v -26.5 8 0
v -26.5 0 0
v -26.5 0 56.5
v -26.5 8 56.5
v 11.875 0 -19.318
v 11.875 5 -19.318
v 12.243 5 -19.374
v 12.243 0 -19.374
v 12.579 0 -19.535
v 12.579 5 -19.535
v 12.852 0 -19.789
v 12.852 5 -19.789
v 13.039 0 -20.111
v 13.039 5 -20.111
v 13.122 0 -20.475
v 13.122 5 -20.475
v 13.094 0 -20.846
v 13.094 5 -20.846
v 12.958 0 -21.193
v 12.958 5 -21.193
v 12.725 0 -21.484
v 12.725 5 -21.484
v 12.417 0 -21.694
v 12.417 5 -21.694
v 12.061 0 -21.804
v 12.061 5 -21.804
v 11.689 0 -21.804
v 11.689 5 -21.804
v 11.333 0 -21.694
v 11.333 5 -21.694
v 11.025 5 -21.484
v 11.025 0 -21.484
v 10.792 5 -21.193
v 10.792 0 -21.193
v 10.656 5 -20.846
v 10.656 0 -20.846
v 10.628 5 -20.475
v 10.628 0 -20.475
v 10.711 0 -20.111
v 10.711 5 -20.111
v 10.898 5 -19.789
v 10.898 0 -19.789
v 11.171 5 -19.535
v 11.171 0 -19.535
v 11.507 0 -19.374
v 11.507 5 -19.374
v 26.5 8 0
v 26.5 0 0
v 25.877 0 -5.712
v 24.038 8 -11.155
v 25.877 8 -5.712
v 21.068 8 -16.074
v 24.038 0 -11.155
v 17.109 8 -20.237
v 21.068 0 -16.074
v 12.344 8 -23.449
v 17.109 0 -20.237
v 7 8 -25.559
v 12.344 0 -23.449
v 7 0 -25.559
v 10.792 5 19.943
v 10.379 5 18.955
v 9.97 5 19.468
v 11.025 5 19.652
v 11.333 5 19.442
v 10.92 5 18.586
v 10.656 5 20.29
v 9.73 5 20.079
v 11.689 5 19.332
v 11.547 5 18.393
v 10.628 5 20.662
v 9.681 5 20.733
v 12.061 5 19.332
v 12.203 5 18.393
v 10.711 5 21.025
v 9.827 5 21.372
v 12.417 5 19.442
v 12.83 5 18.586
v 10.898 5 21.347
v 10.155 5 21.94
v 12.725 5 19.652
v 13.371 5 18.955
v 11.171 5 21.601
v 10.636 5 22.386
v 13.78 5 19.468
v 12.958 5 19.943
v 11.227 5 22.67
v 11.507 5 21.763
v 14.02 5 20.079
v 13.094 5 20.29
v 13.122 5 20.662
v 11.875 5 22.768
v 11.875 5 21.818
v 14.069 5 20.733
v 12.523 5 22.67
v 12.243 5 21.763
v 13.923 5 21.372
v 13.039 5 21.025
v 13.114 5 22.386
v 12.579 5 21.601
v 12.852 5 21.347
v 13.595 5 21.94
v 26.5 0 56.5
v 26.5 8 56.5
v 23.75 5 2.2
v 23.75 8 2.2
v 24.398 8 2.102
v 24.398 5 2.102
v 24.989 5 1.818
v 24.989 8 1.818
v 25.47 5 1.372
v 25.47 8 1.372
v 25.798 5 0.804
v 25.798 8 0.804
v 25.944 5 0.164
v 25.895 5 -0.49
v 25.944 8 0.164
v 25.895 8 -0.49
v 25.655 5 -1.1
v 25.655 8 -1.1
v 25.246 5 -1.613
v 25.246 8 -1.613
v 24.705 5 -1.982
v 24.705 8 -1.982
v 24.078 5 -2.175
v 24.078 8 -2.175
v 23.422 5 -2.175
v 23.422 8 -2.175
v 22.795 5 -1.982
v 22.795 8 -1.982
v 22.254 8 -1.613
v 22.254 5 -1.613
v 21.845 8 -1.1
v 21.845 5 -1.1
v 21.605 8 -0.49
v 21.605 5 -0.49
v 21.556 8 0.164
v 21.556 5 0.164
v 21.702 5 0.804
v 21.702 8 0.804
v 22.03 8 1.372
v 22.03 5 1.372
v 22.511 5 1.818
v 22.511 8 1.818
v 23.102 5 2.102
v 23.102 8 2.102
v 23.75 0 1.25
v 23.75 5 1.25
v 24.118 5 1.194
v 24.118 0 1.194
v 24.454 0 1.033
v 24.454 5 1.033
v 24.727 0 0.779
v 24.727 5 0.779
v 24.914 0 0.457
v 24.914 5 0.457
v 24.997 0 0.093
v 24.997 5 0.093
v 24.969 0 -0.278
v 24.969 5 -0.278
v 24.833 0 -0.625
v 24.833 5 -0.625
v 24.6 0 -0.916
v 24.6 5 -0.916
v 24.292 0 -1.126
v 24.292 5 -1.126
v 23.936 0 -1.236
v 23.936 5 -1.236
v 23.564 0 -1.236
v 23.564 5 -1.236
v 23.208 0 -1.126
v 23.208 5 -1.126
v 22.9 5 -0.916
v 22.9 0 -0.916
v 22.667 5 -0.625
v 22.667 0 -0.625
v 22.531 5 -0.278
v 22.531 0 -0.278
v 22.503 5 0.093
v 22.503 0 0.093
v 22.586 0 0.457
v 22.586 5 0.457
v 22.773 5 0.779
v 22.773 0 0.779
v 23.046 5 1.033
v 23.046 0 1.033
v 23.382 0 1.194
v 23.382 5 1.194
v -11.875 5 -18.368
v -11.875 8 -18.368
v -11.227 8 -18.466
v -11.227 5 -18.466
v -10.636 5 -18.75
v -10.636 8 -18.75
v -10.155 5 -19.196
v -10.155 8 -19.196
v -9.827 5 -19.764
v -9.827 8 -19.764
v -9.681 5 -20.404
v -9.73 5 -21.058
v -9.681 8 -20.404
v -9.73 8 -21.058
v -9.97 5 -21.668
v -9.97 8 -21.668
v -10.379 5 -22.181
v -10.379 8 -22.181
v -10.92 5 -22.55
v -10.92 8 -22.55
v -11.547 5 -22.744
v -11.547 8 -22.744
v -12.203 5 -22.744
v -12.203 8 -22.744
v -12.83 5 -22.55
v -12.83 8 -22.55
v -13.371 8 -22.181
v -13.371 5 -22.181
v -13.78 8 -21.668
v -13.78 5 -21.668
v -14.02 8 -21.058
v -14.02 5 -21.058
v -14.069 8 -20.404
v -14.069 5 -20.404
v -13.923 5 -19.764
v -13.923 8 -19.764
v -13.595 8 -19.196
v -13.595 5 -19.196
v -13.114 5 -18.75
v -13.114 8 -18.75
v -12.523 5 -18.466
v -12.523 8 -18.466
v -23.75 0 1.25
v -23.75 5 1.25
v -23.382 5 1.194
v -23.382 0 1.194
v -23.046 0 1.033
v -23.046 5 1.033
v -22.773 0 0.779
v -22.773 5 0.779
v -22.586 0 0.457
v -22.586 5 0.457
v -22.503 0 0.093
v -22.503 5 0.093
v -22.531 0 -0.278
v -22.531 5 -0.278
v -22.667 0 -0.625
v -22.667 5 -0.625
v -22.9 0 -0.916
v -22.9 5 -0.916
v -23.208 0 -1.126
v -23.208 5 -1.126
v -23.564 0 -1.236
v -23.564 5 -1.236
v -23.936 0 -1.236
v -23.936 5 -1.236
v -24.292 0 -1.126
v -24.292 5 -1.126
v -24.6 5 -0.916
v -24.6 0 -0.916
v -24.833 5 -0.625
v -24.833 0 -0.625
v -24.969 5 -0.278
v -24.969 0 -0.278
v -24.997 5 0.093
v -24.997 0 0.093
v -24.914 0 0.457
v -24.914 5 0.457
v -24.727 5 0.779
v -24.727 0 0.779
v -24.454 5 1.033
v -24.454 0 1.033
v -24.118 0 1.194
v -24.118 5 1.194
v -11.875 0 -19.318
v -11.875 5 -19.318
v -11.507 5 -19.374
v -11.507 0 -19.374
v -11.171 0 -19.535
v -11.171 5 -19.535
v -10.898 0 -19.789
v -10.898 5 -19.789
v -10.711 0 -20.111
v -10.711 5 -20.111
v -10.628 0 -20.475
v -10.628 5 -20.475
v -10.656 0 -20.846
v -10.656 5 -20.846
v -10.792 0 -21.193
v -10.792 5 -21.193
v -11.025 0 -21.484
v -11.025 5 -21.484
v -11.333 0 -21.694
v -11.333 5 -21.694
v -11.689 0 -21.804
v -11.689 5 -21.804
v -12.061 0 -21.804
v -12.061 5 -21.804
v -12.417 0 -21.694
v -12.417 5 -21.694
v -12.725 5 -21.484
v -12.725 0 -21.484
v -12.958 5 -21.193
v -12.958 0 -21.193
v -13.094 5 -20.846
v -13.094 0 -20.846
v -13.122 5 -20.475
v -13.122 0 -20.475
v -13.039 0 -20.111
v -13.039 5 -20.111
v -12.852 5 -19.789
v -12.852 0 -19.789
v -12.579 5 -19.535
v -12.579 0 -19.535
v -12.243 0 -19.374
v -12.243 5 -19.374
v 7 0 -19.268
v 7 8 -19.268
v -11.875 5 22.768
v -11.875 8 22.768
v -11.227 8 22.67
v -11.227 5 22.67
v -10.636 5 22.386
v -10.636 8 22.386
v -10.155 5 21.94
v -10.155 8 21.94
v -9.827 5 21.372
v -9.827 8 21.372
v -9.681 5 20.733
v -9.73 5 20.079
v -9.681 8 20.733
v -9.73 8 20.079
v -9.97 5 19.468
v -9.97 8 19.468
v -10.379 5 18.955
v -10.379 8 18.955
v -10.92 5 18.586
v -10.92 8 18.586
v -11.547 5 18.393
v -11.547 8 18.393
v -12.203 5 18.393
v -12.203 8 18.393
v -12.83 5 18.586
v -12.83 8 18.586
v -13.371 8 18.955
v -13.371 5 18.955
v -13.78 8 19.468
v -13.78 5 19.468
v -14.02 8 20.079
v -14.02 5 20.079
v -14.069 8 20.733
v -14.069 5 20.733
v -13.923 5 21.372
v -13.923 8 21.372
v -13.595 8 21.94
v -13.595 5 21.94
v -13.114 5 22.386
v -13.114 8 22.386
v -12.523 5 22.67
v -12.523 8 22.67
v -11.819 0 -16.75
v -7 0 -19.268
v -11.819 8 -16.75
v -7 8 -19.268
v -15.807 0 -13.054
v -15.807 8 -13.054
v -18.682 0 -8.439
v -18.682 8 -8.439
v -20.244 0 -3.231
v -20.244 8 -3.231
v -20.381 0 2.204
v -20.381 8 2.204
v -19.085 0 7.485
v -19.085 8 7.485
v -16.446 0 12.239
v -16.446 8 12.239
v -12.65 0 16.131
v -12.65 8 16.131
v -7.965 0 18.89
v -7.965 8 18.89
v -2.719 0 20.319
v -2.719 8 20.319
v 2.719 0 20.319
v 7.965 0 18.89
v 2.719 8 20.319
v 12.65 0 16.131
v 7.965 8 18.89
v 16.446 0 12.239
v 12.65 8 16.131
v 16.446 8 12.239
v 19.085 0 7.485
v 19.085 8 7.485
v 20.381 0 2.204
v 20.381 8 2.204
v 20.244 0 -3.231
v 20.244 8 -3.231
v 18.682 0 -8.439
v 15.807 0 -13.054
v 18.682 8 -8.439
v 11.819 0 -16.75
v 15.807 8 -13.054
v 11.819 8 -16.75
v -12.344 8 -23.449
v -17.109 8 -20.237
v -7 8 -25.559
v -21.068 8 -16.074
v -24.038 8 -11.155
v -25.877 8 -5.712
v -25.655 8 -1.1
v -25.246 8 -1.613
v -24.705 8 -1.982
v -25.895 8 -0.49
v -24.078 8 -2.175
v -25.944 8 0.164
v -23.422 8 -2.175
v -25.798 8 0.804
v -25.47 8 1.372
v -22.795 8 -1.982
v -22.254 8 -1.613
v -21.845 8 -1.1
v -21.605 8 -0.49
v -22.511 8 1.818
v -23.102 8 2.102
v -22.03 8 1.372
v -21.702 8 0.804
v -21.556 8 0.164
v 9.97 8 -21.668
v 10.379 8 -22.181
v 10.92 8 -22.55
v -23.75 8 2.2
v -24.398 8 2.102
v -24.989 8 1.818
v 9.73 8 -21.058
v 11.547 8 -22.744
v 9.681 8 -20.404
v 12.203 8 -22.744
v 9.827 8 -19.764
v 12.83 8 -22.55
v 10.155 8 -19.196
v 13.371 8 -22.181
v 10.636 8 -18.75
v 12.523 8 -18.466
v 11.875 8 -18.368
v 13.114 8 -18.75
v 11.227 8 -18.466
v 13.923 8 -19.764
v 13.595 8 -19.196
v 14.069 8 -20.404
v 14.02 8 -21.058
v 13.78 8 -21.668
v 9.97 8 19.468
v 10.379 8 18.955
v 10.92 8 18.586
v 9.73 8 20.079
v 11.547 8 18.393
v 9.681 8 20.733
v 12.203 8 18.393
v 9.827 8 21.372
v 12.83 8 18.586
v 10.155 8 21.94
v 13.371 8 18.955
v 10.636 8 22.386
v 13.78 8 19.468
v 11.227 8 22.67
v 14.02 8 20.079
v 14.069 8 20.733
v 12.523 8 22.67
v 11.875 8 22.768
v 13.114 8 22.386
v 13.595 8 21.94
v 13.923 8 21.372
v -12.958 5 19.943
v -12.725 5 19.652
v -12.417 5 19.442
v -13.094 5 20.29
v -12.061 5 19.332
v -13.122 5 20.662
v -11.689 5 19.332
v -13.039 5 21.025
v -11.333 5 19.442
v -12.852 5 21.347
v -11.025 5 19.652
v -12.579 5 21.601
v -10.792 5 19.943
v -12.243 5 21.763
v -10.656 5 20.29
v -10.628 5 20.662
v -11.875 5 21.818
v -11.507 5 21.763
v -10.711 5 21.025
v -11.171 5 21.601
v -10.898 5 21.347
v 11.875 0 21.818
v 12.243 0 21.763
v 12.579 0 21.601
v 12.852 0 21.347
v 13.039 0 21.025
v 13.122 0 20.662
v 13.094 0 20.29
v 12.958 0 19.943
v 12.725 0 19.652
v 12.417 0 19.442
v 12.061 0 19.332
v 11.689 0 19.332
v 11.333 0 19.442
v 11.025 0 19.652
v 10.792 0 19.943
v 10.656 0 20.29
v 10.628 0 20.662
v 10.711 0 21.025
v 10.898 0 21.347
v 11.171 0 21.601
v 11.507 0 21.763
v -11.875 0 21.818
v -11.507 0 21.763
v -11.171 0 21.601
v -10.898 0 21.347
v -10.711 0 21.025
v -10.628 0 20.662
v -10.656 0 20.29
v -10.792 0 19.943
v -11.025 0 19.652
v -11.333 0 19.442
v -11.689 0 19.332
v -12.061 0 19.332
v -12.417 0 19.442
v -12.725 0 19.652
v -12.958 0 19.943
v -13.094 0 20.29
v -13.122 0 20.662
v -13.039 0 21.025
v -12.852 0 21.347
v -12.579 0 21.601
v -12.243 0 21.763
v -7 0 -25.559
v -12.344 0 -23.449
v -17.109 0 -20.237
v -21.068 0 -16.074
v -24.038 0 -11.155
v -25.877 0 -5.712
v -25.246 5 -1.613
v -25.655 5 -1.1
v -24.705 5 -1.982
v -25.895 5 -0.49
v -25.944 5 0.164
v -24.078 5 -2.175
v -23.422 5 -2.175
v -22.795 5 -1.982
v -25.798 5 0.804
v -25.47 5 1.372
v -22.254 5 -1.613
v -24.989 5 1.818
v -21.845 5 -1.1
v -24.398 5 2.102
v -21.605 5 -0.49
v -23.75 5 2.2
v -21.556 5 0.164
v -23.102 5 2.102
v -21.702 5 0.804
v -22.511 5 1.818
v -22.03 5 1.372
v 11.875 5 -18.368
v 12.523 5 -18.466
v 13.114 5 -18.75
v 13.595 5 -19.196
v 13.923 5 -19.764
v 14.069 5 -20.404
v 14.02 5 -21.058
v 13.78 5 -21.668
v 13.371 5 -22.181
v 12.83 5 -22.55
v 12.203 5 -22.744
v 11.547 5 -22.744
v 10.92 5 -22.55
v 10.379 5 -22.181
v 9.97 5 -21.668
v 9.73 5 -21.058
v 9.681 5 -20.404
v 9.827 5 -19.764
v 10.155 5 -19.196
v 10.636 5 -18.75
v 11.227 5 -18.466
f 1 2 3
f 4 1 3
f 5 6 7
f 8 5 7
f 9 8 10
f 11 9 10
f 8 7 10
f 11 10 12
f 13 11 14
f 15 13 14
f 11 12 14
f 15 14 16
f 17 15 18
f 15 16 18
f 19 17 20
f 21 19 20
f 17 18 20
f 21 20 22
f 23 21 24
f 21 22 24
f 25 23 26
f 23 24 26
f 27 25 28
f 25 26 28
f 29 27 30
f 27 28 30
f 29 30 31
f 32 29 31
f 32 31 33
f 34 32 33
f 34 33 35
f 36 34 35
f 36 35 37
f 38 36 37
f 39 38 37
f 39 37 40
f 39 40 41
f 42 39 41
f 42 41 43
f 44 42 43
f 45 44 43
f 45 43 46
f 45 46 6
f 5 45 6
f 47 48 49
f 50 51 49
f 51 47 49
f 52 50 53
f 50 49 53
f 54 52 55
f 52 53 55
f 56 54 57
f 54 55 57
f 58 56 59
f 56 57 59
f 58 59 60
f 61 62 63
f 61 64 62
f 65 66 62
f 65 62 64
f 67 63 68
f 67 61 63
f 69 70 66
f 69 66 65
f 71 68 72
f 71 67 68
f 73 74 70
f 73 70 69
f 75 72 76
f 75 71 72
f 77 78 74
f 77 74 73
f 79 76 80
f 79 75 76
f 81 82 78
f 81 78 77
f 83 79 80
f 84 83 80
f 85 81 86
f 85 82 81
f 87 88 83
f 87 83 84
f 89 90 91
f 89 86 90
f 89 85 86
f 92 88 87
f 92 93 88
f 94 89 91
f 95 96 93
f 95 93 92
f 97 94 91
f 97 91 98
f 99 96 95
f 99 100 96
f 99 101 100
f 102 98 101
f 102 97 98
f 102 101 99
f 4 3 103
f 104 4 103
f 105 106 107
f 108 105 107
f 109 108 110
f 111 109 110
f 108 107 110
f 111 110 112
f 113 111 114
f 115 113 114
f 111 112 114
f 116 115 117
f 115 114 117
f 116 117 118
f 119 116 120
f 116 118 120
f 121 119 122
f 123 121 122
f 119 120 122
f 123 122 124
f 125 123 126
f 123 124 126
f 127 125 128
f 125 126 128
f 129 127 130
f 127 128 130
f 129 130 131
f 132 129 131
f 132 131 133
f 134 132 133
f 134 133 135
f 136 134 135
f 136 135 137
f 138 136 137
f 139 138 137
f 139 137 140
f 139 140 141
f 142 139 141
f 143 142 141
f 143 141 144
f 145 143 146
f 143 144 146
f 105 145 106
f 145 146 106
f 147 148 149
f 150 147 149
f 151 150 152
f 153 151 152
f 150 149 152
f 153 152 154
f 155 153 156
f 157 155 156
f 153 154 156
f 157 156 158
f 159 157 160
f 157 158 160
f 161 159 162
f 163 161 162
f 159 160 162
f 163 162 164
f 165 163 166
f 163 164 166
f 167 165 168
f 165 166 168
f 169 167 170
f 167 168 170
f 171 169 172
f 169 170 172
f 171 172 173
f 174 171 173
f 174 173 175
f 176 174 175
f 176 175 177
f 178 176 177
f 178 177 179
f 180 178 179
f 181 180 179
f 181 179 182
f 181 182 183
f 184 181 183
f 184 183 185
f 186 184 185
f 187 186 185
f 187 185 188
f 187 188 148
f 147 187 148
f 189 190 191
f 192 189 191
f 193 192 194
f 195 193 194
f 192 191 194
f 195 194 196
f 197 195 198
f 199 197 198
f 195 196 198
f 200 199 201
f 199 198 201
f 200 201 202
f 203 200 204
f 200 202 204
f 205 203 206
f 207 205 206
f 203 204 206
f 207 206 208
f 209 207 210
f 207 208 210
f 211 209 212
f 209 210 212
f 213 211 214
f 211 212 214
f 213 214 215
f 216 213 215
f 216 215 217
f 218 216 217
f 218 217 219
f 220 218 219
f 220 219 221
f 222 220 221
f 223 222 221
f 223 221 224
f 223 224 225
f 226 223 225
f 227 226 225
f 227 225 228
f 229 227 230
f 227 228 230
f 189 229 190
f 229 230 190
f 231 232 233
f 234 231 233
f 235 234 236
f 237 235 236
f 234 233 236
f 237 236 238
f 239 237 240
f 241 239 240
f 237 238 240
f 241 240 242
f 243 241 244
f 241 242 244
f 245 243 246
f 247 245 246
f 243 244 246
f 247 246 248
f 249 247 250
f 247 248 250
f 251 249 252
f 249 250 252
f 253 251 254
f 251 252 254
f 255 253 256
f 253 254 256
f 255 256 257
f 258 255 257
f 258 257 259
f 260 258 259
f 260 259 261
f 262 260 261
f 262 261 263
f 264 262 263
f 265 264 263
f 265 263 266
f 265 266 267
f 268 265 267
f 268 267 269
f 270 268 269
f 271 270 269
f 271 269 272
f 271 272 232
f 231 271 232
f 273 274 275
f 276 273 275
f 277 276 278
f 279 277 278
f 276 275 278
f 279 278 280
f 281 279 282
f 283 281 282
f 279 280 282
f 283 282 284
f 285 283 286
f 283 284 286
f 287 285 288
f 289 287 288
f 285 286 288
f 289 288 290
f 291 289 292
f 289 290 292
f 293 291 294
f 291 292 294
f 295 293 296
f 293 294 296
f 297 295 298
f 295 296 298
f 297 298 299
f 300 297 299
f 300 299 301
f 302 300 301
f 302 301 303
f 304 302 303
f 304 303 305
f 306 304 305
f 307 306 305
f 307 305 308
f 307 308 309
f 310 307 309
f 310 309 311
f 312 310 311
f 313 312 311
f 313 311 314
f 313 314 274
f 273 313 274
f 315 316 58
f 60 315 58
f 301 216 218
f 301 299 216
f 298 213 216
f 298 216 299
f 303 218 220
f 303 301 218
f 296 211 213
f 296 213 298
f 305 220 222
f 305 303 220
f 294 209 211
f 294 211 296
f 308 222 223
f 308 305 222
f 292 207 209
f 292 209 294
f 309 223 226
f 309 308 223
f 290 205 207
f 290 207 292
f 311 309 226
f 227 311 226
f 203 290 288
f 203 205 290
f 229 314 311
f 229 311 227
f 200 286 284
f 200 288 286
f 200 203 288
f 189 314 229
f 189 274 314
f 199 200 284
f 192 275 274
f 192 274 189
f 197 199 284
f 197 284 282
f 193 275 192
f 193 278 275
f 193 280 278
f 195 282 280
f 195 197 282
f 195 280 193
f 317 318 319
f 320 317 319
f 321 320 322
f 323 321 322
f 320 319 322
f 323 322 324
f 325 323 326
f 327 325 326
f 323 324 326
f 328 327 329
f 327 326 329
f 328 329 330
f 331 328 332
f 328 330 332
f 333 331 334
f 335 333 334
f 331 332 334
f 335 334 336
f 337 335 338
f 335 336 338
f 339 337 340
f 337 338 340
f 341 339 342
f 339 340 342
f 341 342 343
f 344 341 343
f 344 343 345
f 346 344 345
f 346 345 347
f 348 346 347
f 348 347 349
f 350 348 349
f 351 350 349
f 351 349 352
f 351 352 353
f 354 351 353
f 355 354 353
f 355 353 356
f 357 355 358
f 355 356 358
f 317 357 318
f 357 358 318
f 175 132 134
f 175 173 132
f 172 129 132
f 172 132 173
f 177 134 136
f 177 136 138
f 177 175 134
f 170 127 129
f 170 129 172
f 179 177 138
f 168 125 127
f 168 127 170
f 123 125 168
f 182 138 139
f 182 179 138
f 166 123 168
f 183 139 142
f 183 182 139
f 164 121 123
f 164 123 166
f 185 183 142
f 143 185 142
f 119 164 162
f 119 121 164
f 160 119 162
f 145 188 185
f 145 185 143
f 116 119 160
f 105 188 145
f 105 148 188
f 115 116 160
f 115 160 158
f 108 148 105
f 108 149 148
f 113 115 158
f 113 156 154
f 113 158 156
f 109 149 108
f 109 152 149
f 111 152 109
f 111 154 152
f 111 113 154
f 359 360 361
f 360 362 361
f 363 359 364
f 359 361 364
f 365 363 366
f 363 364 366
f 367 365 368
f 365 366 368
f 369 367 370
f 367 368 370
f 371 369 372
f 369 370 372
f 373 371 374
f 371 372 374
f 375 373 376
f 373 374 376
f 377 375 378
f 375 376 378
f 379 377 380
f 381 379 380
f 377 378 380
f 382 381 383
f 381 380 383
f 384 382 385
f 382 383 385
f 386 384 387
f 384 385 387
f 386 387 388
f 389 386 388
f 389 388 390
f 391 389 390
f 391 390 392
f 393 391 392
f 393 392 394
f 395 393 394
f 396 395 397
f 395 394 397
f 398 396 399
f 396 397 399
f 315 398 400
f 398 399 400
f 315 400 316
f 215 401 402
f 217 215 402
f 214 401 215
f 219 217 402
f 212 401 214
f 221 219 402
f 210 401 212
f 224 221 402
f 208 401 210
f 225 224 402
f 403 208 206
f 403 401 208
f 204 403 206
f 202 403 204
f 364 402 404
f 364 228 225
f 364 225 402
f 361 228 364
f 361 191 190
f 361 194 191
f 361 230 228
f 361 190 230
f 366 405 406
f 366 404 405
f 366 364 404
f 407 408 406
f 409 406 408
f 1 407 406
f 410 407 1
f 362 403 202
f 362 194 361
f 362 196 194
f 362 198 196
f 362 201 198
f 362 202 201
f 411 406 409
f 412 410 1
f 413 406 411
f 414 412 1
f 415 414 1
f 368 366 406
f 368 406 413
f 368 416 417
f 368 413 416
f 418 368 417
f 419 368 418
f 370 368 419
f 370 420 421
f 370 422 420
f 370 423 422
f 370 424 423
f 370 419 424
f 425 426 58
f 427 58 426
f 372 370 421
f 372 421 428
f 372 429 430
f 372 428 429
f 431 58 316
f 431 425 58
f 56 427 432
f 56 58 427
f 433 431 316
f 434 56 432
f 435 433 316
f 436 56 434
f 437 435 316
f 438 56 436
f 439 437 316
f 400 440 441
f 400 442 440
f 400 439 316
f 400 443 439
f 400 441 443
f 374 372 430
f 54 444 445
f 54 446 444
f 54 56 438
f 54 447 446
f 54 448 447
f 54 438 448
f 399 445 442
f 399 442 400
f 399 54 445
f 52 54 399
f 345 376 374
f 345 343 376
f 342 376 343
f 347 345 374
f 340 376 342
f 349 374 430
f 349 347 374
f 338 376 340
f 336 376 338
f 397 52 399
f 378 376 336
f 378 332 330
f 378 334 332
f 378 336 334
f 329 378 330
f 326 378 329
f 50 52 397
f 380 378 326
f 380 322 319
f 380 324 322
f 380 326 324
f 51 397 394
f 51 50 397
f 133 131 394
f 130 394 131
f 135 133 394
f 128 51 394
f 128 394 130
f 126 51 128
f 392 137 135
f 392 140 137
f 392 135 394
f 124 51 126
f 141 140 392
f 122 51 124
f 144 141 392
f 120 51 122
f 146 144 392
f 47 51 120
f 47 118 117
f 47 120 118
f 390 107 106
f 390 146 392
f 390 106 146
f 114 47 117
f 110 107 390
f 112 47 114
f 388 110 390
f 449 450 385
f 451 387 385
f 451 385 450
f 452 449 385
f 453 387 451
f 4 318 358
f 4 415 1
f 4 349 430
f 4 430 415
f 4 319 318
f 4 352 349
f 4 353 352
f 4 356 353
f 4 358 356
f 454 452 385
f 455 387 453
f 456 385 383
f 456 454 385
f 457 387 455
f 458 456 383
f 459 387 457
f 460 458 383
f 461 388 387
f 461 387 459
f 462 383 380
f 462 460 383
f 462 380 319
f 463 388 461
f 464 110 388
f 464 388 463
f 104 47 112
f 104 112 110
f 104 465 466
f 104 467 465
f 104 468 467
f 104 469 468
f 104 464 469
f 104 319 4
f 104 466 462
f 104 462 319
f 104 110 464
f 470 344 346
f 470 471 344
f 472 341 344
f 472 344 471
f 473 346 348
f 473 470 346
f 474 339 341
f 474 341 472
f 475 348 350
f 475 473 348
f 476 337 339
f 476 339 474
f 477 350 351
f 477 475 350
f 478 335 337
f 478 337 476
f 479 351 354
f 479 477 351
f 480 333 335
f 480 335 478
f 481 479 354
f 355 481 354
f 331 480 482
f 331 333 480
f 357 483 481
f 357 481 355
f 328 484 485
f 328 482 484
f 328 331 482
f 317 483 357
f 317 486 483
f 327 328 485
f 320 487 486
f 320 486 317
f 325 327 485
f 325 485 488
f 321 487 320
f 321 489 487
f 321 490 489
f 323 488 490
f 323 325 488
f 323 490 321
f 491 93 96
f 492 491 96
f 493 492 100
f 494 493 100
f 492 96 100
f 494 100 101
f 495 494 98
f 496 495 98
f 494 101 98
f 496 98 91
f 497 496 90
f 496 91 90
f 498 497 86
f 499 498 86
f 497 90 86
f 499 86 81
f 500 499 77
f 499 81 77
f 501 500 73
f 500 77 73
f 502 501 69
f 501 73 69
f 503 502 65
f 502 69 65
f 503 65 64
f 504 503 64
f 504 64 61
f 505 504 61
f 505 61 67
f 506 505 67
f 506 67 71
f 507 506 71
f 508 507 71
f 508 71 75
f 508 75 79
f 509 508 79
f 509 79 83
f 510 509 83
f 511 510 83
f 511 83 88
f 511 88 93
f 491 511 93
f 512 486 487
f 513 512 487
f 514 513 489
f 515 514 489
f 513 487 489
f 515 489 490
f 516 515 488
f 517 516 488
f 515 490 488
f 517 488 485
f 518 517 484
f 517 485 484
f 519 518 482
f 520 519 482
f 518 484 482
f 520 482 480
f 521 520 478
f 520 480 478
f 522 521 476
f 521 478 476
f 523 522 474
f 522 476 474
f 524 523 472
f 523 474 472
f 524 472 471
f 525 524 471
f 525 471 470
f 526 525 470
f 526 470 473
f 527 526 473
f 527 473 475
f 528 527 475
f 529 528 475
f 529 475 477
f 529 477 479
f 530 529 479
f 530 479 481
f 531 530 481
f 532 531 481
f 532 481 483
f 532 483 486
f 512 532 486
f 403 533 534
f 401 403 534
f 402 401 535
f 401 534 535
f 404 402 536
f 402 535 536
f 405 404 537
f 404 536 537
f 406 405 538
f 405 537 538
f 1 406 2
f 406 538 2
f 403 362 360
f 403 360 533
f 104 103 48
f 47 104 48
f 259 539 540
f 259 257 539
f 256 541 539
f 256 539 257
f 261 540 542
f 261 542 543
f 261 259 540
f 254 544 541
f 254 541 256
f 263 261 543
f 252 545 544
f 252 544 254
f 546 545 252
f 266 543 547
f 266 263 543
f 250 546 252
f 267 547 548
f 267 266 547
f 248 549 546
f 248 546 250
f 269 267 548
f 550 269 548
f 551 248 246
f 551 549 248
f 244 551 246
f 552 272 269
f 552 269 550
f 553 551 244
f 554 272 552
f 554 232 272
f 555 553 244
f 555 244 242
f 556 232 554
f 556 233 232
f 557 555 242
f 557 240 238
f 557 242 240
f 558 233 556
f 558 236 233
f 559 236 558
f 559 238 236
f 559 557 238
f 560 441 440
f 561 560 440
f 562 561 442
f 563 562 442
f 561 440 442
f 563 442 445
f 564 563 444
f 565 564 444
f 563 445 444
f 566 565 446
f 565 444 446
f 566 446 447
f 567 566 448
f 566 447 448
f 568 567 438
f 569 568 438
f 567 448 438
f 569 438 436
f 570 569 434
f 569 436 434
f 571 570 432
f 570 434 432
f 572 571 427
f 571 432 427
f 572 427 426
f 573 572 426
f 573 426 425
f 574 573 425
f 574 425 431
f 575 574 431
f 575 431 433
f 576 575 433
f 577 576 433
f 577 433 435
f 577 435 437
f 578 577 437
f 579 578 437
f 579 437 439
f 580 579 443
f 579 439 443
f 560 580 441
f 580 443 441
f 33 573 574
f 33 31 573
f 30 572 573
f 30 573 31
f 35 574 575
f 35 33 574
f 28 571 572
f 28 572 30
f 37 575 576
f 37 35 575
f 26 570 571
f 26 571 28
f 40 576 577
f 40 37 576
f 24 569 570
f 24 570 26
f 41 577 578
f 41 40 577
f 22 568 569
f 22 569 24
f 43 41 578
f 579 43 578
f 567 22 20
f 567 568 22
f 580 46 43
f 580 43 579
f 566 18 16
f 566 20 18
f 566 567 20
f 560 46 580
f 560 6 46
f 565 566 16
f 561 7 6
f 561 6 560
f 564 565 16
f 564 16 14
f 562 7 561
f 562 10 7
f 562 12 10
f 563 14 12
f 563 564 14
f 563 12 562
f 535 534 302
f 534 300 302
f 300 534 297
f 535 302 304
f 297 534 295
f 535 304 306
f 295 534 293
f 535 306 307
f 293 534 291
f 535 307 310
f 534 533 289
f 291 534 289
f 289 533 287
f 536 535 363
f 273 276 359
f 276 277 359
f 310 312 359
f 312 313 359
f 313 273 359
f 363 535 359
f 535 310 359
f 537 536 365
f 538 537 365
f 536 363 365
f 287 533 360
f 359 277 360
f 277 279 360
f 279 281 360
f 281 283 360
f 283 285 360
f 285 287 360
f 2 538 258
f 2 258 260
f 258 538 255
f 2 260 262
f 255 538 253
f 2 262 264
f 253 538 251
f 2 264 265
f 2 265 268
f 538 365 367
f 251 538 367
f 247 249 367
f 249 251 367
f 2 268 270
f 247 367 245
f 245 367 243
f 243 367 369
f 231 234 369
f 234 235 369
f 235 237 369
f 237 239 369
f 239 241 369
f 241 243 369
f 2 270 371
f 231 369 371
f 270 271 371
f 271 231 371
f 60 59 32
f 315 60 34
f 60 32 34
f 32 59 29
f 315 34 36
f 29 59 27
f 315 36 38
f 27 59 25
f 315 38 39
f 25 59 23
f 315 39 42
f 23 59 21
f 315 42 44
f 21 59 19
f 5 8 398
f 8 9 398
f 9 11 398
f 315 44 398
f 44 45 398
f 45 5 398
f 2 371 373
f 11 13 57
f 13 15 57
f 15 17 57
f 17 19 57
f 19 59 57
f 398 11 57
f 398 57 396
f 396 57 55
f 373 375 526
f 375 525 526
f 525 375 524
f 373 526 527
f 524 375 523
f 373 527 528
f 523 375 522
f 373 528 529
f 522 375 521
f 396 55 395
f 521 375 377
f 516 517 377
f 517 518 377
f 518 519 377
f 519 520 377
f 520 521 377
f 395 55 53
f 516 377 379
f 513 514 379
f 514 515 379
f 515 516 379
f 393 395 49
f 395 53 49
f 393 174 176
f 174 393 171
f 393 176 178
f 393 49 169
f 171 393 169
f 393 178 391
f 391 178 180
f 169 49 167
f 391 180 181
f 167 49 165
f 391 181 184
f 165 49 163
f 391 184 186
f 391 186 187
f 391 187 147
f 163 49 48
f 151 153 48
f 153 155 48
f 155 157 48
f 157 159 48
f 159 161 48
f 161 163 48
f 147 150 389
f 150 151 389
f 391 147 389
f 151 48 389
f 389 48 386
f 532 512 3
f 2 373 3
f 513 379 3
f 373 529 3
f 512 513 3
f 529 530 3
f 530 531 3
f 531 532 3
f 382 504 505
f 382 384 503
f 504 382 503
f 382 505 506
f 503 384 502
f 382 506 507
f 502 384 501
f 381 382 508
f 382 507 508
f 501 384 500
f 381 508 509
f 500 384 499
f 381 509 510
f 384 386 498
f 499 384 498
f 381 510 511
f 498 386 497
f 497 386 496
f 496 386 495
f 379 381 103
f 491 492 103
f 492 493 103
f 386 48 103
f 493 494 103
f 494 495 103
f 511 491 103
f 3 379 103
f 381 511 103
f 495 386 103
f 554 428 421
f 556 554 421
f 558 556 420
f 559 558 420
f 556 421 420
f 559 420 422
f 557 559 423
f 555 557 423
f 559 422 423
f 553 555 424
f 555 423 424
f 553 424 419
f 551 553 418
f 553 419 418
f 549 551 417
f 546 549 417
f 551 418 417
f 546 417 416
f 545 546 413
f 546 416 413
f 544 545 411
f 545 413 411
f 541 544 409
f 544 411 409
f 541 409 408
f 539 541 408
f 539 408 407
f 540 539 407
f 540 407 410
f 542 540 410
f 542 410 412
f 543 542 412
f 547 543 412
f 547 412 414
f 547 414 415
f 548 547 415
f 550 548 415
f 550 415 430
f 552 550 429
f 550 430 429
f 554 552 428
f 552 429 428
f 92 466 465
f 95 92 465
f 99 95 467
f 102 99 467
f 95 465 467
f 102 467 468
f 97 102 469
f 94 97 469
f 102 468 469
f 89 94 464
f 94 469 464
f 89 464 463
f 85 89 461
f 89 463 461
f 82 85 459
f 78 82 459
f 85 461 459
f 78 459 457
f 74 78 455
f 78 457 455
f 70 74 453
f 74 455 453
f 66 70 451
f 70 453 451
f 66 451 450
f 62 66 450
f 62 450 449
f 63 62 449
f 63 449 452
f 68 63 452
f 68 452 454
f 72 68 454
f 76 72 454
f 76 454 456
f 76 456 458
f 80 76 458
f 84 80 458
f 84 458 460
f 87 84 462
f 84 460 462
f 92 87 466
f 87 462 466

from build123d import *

# Parameters (mm, degrees)
SKETCH1_R           = 26.5
BOSS_EXTRUDE1_DEPTH = 8
SKETCH2_R           = 20.5
CUT_EXTRUDE1_DEPTH  = 8
SKETCH3_W           = 14
SKETCH3_H           = 29.703096534
CUT_EXTRUDE2_DEPTH  = 15
BOSS_EXTRUDE2_START = -8
BOSS_EXTRUDE2_DEPTH = 8
SKETCH5_R           = 1.25
CUT_EXTRUDE3_DEPTH  = 8
SKETCH6_R           = 2.2
CUT_EXTRUDE4_DEPTH  = 3


with BuildPart() as part:
    # Sketch1 → Boss-Extrude1 (new body)
    with BuildSketch(Plane(origin=(0, 0, 0), x_dir=(1, 0, 0), z_dir=(0, 1, 0))):
        with Locations(Location((0, 0, 0), (0, 0, 270))):
            Circle(SKETCH1_R)
    extrude(amount=BOSS_EXTRUDE1_DEPTH)

    # Sketch2 → Cut-Extrude1 (cut)
    with BuildSketch(Plane(origin=(0, 8, 0), x_dir=(1, 0, 0), z_dir=(0, 1, 0))):
        with Locations(Location((0, 0, 0), (0, 0, 270))):
            Circle(SKETCH2_R)
    extrude(amount=-CUT_EXTRUDE1_DEPTH, mode=Mode.SUBTRACT)

    # Sketch3 → Cut-Extrude2 (cut)
    with BuildSketch(Plane(origin=(0, 8, 0), x_dir=(1, 0, 0), z_dir=(0, 1, 0))):
        with Locations((0, 12.871341831)):
            Rectangle(SKETCH3_W, SKETCH3_H)
    extrude(amount=-CUT_EXTRUDE2_DEPTH, mode=Mode.SUBTRACT)

    # Sketch4 → Boss-Extrude2 (add)
    with BuildSketch(Plane(origin=(0, 8, 0), x_dir=(1, 0, 0), z_dir=(0, 1, 0)).offset(BOSS_EXTRUDE2_START)):
        with BuildLine():
            Line((-26.5, 0), (-26.5, -56.5))
            Line((-26.5, -56.5), (26.5, -56.5))
            Line((26.5, -56.5), (26.5, 0))
            ThreePointArc((26.5, 0), (0, -26.5), (-26.5, 0))
        make_face()
    extrude(amount=BOSS_EXTRUDE2_DEPTH)

    # Sketch5 → Cut-Extrude3 (cut)
    with BuildSketch(Plane(origin=(0, 8, 0), x_dir=(1, 0, 0), z_dir=(0, 1, 0))):
        with Locations(Location((23.75, 0, 0), (0, 0, 270))):
            Circle(SKETCH5_R)
        with Locations(Location((11.875, -20.56810334, 0), (0, 0, 270))):
            Circle(SKETCH5_R)
        with Locations(Location((-11.875, -20.56810334, 0), (0, 0, 270))):
            Circle(SKETCH5_R)
        with Locations(Location((-23.75, 0, 0), (0, 0, 270))):
            Circle(SKETCH5_R)
        with Locations(Location((-11.875, 20.56810334, 0), (0, 0, 270))):
            Circle(SKETCH5_R)
        with Locations(Location((11.875, 20.56810334, 0), (0, 0, 270))):
            Circle(SKETCH5_R)
    extrude(amount=-CUT_EXTRUDE3_DEPTH, mode=Mode.SUBTRACT)

    # Sketch6 → Cut-Extrude4 (cut)
    with BuildSketch(Plane(origin=(0, 8, 0), x_dir=(1, 0, 0), z_dir=(0, 1, 0))):
        with Locations(Location((23.75, 0, 0), (0, 0, 270))):
            Circle(SKETCH6_R)
        with Locations(Location((11.875, -20.56810334, 0), (0, 0, 270))):
            Circle(SKETCH6_R)
        with Locations(Location((-11.875, -20.56810334, 0), (0, 0, 270))):
            Circle(SKETCH6_R)
        with Locations(Location((-23.75, 0, 0), (0, 0, 270))):
            Circle(SKETCH6_R)
        with Locations(Location((-11.875, 20.56810334, 0), (0, 0, 270))):
            Circle(SKETCH6_R)
        with Locations(Location((11.875, 20.56810334, 0), (0, 0, 270))):
            Circle(SKETCH6_R)
    extrude(amount=-CUT_EXTRUDE4_DEPTH, mode=Mode.SUBTRACT)


solid = part.part
